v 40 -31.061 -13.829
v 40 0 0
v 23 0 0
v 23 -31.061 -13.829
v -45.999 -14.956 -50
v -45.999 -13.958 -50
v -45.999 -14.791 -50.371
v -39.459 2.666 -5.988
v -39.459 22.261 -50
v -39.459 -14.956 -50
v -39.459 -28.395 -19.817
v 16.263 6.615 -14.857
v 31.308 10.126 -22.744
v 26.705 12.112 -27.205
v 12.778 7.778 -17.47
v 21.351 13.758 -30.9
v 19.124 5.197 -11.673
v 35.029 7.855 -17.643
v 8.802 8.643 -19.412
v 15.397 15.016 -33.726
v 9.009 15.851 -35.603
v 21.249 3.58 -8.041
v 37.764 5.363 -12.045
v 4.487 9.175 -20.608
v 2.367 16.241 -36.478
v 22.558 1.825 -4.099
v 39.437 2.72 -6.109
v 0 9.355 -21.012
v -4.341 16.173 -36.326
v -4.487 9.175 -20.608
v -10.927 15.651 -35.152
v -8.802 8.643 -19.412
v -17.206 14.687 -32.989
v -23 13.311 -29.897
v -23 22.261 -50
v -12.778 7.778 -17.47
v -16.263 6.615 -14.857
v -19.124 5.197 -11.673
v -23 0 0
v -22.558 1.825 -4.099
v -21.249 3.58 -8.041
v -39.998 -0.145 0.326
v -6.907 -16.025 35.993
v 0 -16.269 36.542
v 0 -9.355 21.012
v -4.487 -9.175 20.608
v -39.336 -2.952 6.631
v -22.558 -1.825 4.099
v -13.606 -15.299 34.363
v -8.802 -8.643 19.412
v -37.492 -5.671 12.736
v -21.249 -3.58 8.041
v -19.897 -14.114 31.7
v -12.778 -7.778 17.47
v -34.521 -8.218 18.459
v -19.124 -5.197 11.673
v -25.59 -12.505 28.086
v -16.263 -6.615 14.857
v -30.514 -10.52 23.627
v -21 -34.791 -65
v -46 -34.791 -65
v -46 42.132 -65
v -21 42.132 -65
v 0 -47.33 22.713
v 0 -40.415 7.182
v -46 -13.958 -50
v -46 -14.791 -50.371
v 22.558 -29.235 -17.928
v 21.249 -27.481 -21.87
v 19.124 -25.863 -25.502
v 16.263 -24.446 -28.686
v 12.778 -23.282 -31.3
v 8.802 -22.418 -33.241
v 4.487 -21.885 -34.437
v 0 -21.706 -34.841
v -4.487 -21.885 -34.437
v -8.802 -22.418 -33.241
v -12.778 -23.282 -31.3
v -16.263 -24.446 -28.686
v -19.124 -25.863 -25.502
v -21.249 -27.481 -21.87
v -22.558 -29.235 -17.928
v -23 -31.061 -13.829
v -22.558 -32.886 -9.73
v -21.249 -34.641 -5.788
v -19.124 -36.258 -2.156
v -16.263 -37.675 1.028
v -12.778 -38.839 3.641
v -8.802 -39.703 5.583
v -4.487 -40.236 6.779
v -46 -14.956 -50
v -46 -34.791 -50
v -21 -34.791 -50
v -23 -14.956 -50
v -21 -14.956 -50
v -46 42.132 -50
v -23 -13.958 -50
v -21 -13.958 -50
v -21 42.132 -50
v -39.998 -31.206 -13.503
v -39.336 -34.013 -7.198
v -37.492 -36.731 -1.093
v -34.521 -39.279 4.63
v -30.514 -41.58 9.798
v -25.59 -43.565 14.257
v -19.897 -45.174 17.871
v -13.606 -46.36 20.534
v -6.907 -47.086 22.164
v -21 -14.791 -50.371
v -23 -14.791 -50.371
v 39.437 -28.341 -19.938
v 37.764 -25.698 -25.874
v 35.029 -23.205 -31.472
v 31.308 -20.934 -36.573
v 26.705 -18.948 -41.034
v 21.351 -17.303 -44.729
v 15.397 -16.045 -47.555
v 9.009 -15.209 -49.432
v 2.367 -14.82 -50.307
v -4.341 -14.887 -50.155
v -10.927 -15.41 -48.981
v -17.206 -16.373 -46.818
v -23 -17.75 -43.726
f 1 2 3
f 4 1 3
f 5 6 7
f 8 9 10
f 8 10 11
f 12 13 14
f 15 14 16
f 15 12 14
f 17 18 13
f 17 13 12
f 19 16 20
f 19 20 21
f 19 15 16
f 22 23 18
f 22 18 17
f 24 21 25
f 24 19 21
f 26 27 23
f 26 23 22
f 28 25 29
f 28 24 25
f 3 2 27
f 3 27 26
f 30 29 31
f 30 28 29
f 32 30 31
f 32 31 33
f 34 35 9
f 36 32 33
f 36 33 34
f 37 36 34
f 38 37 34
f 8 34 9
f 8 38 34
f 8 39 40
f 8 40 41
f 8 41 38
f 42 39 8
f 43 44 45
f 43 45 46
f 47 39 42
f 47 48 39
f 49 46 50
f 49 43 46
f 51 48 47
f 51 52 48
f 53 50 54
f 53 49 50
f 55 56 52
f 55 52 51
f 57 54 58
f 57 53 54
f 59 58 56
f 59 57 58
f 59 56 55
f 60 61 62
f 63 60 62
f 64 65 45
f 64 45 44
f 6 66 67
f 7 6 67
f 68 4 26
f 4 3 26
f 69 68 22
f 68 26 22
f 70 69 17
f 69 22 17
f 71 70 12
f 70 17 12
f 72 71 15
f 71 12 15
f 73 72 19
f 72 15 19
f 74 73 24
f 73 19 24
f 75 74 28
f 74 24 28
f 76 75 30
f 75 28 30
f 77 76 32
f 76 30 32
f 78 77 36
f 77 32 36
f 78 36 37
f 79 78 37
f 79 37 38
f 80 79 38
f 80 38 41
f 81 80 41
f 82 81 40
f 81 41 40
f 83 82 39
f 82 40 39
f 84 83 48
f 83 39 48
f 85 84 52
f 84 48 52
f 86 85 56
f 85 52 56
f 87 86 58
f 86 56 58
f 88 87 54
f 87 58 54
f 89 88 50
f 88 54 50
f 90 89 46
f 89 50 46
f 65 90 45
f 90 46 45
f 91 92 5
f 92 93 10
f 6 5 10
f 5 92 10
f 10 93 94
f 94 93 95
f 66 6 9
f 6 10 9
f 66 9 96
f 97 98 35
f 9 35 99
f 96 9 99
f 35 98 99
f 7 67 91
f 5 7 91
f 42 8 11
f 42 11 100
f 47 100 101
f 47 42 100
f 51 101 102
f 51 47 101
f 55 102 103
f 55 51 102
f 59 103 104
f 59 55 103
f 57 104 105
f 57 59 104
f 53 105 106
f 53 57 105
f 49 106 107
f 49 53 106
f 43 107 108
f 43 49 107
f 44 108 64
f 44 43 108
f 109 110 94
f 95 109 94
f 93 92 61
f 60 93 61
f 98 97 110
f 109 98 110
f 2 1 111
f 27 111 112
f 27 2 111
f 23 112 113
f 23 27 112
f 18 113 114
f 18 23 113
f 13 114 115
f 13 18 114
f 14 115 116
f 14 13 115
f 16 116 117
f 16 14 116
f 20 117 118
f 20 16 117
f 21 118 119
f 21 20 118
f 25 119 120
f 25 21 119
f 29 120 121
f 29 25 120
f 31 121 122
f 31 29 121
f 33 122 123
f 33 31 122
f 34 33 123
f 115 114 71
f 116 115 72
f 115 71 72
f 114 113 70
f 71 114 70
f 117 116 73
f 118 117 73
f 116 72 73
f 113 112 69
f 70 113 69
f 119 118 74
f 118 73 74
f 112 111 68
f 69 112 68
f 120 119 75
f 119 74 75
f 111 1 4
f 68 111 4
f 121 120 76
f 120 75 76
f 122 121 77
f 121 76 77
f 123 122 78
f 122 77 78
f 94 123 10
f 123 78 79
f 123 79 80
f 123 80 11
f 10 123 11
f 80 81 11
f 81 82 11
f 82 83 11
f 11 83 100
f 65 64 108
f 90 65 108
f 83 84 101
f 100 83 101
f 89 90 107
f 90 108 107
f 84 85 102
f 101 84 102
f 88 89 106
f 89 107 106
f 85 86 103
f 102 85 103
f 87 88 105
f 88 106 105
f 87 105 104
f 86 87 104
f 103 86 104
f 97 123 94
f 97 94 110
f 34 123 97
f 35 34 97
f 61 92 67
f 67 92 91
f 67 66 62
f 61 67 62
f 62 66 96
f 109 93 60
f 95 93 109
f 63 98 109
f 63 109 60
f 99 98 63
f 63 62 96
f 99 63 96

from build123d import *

# Parameters (mm, degrees)
F2_R      = 40
F2_R_2    = 23
F4_DEPTH  = 34
F8_DEPTH  = 25
F11_DEPTH = 34
F12_DEPTH = 25
F13_DEPTH = 180.6
F15_DEPTH = 6.54


with BuildPart() as f4:
    # F2 (on line) → F4 (new body)
    with BuildSketch(Plane(origin=(0, 0, 0), x_dir=(-1, 0, 0), z_dir=(0, 0.9135454576, 0.4067366431))):
        Circle(F2_R)
        Circle(F2_R_2, mode=Mode.SUBTRACT)
    extrude(amount=-F4_DEPTH)



with BuildPart() as f8:
    # F7 (on offset) → F8 (new body)
    with BuildSketch(Plane.YZ.offset(-46)):
        Polygon((-14.7910798368, -50.3708641703), (-14.9561992038, -50), (-34.7910798368, -50), (-34.7910798368, -65), (-14.7910798368, -65), align=None)
        Polygon((42.1320945024, -50), (22.2614342654, -50), (28.9398645451, -65), (42.1320945024, -65), align=None)
        Polygon((22.2614342654, -50), (0, -50), (0, -65), (28.9398645451, -65), align=None)
        Polygon((-8.2777689242, -65), (-14.7910798368, -50.3708641703), (-14.7910798368, -65), align=None)
        Polygon((0, -65), (0, -50), (-13.9581052722, -50), (-14.7910798368, -50.3708641703), (-8.2777689242, -65), align=None)
    extrude(amount=F8_DEPTH)


with BuildPart() as f4_1:
    add(f4.part)

    add(f8.part)  # F11 merges F8
    # F10 (on face) → F11 (join, through all)
    with BuildSketch(Plane(origin=(0, 0, 0), x_dir=(-1, 0, 0), z_dir=(0, 0.9135454576, 0.4067366431))):
        with BuildLine():
            ThreePointArc((39.4592955709, -6.5546924453), (33.8604048962, -21.2949050306), (23, -32.7261363439))
            Line((23, -32.7261363439), (23, -83.8858187199))
            Line((23, -83.8858187199), (39.4592955709, -83.8858187199))
            Line((39.4592955709, -83.8858187199), (39.4592955709, -6.5546924453))
        make_face()
    extrude(amount=-F11_DEPTH)

    # F12 (cut): a face of the model
    f12_faces = [f4_1.faces().sort_by_distance(p)[0] for p in [
        (-39.4592955709, 12.3389864526, -74.7036267653),
    ]]
    extrude(f12_faces, amount=-F12_DEPTH, mode=Mode.SUBTRACT)

    # F9 (on line) → F13 (cut)
    with BuildSketch(Plane(origin=(0, 0, 0), x_dir=(-1, 0, 0), z_dir=(0, 0.9135454576, 0.4067366431))):
        with BuildLine():
            Line((0, 23), (0, 40))
            ThreePointArc((0, 40), (-28.2842712475, 28.2842712475), (-40, 0))
            Line((-40, 0), (-23, 0))
            ThreePointArc((-23, 0), (-16.2634559673, 16.2634559673), (0, 23))
        make_face()
    extrude(amount=-F13_DEPTH, mode=Mode.SUBTRACT)

    # F14 (on face) → F15 (join)
    with BuildSketch(Plane(origin=(-39.4592955709, 0, 0), x_dir=(0, -1, 0), z_dir=(-1, 0, 0))):
        Polygon((14.7910798368, -50.3708641703), (14.9561992038, -50), (13.9581052722, -50), align=None)
    extrude(amount=F15_DEPTH)


solid = f4_1.part
